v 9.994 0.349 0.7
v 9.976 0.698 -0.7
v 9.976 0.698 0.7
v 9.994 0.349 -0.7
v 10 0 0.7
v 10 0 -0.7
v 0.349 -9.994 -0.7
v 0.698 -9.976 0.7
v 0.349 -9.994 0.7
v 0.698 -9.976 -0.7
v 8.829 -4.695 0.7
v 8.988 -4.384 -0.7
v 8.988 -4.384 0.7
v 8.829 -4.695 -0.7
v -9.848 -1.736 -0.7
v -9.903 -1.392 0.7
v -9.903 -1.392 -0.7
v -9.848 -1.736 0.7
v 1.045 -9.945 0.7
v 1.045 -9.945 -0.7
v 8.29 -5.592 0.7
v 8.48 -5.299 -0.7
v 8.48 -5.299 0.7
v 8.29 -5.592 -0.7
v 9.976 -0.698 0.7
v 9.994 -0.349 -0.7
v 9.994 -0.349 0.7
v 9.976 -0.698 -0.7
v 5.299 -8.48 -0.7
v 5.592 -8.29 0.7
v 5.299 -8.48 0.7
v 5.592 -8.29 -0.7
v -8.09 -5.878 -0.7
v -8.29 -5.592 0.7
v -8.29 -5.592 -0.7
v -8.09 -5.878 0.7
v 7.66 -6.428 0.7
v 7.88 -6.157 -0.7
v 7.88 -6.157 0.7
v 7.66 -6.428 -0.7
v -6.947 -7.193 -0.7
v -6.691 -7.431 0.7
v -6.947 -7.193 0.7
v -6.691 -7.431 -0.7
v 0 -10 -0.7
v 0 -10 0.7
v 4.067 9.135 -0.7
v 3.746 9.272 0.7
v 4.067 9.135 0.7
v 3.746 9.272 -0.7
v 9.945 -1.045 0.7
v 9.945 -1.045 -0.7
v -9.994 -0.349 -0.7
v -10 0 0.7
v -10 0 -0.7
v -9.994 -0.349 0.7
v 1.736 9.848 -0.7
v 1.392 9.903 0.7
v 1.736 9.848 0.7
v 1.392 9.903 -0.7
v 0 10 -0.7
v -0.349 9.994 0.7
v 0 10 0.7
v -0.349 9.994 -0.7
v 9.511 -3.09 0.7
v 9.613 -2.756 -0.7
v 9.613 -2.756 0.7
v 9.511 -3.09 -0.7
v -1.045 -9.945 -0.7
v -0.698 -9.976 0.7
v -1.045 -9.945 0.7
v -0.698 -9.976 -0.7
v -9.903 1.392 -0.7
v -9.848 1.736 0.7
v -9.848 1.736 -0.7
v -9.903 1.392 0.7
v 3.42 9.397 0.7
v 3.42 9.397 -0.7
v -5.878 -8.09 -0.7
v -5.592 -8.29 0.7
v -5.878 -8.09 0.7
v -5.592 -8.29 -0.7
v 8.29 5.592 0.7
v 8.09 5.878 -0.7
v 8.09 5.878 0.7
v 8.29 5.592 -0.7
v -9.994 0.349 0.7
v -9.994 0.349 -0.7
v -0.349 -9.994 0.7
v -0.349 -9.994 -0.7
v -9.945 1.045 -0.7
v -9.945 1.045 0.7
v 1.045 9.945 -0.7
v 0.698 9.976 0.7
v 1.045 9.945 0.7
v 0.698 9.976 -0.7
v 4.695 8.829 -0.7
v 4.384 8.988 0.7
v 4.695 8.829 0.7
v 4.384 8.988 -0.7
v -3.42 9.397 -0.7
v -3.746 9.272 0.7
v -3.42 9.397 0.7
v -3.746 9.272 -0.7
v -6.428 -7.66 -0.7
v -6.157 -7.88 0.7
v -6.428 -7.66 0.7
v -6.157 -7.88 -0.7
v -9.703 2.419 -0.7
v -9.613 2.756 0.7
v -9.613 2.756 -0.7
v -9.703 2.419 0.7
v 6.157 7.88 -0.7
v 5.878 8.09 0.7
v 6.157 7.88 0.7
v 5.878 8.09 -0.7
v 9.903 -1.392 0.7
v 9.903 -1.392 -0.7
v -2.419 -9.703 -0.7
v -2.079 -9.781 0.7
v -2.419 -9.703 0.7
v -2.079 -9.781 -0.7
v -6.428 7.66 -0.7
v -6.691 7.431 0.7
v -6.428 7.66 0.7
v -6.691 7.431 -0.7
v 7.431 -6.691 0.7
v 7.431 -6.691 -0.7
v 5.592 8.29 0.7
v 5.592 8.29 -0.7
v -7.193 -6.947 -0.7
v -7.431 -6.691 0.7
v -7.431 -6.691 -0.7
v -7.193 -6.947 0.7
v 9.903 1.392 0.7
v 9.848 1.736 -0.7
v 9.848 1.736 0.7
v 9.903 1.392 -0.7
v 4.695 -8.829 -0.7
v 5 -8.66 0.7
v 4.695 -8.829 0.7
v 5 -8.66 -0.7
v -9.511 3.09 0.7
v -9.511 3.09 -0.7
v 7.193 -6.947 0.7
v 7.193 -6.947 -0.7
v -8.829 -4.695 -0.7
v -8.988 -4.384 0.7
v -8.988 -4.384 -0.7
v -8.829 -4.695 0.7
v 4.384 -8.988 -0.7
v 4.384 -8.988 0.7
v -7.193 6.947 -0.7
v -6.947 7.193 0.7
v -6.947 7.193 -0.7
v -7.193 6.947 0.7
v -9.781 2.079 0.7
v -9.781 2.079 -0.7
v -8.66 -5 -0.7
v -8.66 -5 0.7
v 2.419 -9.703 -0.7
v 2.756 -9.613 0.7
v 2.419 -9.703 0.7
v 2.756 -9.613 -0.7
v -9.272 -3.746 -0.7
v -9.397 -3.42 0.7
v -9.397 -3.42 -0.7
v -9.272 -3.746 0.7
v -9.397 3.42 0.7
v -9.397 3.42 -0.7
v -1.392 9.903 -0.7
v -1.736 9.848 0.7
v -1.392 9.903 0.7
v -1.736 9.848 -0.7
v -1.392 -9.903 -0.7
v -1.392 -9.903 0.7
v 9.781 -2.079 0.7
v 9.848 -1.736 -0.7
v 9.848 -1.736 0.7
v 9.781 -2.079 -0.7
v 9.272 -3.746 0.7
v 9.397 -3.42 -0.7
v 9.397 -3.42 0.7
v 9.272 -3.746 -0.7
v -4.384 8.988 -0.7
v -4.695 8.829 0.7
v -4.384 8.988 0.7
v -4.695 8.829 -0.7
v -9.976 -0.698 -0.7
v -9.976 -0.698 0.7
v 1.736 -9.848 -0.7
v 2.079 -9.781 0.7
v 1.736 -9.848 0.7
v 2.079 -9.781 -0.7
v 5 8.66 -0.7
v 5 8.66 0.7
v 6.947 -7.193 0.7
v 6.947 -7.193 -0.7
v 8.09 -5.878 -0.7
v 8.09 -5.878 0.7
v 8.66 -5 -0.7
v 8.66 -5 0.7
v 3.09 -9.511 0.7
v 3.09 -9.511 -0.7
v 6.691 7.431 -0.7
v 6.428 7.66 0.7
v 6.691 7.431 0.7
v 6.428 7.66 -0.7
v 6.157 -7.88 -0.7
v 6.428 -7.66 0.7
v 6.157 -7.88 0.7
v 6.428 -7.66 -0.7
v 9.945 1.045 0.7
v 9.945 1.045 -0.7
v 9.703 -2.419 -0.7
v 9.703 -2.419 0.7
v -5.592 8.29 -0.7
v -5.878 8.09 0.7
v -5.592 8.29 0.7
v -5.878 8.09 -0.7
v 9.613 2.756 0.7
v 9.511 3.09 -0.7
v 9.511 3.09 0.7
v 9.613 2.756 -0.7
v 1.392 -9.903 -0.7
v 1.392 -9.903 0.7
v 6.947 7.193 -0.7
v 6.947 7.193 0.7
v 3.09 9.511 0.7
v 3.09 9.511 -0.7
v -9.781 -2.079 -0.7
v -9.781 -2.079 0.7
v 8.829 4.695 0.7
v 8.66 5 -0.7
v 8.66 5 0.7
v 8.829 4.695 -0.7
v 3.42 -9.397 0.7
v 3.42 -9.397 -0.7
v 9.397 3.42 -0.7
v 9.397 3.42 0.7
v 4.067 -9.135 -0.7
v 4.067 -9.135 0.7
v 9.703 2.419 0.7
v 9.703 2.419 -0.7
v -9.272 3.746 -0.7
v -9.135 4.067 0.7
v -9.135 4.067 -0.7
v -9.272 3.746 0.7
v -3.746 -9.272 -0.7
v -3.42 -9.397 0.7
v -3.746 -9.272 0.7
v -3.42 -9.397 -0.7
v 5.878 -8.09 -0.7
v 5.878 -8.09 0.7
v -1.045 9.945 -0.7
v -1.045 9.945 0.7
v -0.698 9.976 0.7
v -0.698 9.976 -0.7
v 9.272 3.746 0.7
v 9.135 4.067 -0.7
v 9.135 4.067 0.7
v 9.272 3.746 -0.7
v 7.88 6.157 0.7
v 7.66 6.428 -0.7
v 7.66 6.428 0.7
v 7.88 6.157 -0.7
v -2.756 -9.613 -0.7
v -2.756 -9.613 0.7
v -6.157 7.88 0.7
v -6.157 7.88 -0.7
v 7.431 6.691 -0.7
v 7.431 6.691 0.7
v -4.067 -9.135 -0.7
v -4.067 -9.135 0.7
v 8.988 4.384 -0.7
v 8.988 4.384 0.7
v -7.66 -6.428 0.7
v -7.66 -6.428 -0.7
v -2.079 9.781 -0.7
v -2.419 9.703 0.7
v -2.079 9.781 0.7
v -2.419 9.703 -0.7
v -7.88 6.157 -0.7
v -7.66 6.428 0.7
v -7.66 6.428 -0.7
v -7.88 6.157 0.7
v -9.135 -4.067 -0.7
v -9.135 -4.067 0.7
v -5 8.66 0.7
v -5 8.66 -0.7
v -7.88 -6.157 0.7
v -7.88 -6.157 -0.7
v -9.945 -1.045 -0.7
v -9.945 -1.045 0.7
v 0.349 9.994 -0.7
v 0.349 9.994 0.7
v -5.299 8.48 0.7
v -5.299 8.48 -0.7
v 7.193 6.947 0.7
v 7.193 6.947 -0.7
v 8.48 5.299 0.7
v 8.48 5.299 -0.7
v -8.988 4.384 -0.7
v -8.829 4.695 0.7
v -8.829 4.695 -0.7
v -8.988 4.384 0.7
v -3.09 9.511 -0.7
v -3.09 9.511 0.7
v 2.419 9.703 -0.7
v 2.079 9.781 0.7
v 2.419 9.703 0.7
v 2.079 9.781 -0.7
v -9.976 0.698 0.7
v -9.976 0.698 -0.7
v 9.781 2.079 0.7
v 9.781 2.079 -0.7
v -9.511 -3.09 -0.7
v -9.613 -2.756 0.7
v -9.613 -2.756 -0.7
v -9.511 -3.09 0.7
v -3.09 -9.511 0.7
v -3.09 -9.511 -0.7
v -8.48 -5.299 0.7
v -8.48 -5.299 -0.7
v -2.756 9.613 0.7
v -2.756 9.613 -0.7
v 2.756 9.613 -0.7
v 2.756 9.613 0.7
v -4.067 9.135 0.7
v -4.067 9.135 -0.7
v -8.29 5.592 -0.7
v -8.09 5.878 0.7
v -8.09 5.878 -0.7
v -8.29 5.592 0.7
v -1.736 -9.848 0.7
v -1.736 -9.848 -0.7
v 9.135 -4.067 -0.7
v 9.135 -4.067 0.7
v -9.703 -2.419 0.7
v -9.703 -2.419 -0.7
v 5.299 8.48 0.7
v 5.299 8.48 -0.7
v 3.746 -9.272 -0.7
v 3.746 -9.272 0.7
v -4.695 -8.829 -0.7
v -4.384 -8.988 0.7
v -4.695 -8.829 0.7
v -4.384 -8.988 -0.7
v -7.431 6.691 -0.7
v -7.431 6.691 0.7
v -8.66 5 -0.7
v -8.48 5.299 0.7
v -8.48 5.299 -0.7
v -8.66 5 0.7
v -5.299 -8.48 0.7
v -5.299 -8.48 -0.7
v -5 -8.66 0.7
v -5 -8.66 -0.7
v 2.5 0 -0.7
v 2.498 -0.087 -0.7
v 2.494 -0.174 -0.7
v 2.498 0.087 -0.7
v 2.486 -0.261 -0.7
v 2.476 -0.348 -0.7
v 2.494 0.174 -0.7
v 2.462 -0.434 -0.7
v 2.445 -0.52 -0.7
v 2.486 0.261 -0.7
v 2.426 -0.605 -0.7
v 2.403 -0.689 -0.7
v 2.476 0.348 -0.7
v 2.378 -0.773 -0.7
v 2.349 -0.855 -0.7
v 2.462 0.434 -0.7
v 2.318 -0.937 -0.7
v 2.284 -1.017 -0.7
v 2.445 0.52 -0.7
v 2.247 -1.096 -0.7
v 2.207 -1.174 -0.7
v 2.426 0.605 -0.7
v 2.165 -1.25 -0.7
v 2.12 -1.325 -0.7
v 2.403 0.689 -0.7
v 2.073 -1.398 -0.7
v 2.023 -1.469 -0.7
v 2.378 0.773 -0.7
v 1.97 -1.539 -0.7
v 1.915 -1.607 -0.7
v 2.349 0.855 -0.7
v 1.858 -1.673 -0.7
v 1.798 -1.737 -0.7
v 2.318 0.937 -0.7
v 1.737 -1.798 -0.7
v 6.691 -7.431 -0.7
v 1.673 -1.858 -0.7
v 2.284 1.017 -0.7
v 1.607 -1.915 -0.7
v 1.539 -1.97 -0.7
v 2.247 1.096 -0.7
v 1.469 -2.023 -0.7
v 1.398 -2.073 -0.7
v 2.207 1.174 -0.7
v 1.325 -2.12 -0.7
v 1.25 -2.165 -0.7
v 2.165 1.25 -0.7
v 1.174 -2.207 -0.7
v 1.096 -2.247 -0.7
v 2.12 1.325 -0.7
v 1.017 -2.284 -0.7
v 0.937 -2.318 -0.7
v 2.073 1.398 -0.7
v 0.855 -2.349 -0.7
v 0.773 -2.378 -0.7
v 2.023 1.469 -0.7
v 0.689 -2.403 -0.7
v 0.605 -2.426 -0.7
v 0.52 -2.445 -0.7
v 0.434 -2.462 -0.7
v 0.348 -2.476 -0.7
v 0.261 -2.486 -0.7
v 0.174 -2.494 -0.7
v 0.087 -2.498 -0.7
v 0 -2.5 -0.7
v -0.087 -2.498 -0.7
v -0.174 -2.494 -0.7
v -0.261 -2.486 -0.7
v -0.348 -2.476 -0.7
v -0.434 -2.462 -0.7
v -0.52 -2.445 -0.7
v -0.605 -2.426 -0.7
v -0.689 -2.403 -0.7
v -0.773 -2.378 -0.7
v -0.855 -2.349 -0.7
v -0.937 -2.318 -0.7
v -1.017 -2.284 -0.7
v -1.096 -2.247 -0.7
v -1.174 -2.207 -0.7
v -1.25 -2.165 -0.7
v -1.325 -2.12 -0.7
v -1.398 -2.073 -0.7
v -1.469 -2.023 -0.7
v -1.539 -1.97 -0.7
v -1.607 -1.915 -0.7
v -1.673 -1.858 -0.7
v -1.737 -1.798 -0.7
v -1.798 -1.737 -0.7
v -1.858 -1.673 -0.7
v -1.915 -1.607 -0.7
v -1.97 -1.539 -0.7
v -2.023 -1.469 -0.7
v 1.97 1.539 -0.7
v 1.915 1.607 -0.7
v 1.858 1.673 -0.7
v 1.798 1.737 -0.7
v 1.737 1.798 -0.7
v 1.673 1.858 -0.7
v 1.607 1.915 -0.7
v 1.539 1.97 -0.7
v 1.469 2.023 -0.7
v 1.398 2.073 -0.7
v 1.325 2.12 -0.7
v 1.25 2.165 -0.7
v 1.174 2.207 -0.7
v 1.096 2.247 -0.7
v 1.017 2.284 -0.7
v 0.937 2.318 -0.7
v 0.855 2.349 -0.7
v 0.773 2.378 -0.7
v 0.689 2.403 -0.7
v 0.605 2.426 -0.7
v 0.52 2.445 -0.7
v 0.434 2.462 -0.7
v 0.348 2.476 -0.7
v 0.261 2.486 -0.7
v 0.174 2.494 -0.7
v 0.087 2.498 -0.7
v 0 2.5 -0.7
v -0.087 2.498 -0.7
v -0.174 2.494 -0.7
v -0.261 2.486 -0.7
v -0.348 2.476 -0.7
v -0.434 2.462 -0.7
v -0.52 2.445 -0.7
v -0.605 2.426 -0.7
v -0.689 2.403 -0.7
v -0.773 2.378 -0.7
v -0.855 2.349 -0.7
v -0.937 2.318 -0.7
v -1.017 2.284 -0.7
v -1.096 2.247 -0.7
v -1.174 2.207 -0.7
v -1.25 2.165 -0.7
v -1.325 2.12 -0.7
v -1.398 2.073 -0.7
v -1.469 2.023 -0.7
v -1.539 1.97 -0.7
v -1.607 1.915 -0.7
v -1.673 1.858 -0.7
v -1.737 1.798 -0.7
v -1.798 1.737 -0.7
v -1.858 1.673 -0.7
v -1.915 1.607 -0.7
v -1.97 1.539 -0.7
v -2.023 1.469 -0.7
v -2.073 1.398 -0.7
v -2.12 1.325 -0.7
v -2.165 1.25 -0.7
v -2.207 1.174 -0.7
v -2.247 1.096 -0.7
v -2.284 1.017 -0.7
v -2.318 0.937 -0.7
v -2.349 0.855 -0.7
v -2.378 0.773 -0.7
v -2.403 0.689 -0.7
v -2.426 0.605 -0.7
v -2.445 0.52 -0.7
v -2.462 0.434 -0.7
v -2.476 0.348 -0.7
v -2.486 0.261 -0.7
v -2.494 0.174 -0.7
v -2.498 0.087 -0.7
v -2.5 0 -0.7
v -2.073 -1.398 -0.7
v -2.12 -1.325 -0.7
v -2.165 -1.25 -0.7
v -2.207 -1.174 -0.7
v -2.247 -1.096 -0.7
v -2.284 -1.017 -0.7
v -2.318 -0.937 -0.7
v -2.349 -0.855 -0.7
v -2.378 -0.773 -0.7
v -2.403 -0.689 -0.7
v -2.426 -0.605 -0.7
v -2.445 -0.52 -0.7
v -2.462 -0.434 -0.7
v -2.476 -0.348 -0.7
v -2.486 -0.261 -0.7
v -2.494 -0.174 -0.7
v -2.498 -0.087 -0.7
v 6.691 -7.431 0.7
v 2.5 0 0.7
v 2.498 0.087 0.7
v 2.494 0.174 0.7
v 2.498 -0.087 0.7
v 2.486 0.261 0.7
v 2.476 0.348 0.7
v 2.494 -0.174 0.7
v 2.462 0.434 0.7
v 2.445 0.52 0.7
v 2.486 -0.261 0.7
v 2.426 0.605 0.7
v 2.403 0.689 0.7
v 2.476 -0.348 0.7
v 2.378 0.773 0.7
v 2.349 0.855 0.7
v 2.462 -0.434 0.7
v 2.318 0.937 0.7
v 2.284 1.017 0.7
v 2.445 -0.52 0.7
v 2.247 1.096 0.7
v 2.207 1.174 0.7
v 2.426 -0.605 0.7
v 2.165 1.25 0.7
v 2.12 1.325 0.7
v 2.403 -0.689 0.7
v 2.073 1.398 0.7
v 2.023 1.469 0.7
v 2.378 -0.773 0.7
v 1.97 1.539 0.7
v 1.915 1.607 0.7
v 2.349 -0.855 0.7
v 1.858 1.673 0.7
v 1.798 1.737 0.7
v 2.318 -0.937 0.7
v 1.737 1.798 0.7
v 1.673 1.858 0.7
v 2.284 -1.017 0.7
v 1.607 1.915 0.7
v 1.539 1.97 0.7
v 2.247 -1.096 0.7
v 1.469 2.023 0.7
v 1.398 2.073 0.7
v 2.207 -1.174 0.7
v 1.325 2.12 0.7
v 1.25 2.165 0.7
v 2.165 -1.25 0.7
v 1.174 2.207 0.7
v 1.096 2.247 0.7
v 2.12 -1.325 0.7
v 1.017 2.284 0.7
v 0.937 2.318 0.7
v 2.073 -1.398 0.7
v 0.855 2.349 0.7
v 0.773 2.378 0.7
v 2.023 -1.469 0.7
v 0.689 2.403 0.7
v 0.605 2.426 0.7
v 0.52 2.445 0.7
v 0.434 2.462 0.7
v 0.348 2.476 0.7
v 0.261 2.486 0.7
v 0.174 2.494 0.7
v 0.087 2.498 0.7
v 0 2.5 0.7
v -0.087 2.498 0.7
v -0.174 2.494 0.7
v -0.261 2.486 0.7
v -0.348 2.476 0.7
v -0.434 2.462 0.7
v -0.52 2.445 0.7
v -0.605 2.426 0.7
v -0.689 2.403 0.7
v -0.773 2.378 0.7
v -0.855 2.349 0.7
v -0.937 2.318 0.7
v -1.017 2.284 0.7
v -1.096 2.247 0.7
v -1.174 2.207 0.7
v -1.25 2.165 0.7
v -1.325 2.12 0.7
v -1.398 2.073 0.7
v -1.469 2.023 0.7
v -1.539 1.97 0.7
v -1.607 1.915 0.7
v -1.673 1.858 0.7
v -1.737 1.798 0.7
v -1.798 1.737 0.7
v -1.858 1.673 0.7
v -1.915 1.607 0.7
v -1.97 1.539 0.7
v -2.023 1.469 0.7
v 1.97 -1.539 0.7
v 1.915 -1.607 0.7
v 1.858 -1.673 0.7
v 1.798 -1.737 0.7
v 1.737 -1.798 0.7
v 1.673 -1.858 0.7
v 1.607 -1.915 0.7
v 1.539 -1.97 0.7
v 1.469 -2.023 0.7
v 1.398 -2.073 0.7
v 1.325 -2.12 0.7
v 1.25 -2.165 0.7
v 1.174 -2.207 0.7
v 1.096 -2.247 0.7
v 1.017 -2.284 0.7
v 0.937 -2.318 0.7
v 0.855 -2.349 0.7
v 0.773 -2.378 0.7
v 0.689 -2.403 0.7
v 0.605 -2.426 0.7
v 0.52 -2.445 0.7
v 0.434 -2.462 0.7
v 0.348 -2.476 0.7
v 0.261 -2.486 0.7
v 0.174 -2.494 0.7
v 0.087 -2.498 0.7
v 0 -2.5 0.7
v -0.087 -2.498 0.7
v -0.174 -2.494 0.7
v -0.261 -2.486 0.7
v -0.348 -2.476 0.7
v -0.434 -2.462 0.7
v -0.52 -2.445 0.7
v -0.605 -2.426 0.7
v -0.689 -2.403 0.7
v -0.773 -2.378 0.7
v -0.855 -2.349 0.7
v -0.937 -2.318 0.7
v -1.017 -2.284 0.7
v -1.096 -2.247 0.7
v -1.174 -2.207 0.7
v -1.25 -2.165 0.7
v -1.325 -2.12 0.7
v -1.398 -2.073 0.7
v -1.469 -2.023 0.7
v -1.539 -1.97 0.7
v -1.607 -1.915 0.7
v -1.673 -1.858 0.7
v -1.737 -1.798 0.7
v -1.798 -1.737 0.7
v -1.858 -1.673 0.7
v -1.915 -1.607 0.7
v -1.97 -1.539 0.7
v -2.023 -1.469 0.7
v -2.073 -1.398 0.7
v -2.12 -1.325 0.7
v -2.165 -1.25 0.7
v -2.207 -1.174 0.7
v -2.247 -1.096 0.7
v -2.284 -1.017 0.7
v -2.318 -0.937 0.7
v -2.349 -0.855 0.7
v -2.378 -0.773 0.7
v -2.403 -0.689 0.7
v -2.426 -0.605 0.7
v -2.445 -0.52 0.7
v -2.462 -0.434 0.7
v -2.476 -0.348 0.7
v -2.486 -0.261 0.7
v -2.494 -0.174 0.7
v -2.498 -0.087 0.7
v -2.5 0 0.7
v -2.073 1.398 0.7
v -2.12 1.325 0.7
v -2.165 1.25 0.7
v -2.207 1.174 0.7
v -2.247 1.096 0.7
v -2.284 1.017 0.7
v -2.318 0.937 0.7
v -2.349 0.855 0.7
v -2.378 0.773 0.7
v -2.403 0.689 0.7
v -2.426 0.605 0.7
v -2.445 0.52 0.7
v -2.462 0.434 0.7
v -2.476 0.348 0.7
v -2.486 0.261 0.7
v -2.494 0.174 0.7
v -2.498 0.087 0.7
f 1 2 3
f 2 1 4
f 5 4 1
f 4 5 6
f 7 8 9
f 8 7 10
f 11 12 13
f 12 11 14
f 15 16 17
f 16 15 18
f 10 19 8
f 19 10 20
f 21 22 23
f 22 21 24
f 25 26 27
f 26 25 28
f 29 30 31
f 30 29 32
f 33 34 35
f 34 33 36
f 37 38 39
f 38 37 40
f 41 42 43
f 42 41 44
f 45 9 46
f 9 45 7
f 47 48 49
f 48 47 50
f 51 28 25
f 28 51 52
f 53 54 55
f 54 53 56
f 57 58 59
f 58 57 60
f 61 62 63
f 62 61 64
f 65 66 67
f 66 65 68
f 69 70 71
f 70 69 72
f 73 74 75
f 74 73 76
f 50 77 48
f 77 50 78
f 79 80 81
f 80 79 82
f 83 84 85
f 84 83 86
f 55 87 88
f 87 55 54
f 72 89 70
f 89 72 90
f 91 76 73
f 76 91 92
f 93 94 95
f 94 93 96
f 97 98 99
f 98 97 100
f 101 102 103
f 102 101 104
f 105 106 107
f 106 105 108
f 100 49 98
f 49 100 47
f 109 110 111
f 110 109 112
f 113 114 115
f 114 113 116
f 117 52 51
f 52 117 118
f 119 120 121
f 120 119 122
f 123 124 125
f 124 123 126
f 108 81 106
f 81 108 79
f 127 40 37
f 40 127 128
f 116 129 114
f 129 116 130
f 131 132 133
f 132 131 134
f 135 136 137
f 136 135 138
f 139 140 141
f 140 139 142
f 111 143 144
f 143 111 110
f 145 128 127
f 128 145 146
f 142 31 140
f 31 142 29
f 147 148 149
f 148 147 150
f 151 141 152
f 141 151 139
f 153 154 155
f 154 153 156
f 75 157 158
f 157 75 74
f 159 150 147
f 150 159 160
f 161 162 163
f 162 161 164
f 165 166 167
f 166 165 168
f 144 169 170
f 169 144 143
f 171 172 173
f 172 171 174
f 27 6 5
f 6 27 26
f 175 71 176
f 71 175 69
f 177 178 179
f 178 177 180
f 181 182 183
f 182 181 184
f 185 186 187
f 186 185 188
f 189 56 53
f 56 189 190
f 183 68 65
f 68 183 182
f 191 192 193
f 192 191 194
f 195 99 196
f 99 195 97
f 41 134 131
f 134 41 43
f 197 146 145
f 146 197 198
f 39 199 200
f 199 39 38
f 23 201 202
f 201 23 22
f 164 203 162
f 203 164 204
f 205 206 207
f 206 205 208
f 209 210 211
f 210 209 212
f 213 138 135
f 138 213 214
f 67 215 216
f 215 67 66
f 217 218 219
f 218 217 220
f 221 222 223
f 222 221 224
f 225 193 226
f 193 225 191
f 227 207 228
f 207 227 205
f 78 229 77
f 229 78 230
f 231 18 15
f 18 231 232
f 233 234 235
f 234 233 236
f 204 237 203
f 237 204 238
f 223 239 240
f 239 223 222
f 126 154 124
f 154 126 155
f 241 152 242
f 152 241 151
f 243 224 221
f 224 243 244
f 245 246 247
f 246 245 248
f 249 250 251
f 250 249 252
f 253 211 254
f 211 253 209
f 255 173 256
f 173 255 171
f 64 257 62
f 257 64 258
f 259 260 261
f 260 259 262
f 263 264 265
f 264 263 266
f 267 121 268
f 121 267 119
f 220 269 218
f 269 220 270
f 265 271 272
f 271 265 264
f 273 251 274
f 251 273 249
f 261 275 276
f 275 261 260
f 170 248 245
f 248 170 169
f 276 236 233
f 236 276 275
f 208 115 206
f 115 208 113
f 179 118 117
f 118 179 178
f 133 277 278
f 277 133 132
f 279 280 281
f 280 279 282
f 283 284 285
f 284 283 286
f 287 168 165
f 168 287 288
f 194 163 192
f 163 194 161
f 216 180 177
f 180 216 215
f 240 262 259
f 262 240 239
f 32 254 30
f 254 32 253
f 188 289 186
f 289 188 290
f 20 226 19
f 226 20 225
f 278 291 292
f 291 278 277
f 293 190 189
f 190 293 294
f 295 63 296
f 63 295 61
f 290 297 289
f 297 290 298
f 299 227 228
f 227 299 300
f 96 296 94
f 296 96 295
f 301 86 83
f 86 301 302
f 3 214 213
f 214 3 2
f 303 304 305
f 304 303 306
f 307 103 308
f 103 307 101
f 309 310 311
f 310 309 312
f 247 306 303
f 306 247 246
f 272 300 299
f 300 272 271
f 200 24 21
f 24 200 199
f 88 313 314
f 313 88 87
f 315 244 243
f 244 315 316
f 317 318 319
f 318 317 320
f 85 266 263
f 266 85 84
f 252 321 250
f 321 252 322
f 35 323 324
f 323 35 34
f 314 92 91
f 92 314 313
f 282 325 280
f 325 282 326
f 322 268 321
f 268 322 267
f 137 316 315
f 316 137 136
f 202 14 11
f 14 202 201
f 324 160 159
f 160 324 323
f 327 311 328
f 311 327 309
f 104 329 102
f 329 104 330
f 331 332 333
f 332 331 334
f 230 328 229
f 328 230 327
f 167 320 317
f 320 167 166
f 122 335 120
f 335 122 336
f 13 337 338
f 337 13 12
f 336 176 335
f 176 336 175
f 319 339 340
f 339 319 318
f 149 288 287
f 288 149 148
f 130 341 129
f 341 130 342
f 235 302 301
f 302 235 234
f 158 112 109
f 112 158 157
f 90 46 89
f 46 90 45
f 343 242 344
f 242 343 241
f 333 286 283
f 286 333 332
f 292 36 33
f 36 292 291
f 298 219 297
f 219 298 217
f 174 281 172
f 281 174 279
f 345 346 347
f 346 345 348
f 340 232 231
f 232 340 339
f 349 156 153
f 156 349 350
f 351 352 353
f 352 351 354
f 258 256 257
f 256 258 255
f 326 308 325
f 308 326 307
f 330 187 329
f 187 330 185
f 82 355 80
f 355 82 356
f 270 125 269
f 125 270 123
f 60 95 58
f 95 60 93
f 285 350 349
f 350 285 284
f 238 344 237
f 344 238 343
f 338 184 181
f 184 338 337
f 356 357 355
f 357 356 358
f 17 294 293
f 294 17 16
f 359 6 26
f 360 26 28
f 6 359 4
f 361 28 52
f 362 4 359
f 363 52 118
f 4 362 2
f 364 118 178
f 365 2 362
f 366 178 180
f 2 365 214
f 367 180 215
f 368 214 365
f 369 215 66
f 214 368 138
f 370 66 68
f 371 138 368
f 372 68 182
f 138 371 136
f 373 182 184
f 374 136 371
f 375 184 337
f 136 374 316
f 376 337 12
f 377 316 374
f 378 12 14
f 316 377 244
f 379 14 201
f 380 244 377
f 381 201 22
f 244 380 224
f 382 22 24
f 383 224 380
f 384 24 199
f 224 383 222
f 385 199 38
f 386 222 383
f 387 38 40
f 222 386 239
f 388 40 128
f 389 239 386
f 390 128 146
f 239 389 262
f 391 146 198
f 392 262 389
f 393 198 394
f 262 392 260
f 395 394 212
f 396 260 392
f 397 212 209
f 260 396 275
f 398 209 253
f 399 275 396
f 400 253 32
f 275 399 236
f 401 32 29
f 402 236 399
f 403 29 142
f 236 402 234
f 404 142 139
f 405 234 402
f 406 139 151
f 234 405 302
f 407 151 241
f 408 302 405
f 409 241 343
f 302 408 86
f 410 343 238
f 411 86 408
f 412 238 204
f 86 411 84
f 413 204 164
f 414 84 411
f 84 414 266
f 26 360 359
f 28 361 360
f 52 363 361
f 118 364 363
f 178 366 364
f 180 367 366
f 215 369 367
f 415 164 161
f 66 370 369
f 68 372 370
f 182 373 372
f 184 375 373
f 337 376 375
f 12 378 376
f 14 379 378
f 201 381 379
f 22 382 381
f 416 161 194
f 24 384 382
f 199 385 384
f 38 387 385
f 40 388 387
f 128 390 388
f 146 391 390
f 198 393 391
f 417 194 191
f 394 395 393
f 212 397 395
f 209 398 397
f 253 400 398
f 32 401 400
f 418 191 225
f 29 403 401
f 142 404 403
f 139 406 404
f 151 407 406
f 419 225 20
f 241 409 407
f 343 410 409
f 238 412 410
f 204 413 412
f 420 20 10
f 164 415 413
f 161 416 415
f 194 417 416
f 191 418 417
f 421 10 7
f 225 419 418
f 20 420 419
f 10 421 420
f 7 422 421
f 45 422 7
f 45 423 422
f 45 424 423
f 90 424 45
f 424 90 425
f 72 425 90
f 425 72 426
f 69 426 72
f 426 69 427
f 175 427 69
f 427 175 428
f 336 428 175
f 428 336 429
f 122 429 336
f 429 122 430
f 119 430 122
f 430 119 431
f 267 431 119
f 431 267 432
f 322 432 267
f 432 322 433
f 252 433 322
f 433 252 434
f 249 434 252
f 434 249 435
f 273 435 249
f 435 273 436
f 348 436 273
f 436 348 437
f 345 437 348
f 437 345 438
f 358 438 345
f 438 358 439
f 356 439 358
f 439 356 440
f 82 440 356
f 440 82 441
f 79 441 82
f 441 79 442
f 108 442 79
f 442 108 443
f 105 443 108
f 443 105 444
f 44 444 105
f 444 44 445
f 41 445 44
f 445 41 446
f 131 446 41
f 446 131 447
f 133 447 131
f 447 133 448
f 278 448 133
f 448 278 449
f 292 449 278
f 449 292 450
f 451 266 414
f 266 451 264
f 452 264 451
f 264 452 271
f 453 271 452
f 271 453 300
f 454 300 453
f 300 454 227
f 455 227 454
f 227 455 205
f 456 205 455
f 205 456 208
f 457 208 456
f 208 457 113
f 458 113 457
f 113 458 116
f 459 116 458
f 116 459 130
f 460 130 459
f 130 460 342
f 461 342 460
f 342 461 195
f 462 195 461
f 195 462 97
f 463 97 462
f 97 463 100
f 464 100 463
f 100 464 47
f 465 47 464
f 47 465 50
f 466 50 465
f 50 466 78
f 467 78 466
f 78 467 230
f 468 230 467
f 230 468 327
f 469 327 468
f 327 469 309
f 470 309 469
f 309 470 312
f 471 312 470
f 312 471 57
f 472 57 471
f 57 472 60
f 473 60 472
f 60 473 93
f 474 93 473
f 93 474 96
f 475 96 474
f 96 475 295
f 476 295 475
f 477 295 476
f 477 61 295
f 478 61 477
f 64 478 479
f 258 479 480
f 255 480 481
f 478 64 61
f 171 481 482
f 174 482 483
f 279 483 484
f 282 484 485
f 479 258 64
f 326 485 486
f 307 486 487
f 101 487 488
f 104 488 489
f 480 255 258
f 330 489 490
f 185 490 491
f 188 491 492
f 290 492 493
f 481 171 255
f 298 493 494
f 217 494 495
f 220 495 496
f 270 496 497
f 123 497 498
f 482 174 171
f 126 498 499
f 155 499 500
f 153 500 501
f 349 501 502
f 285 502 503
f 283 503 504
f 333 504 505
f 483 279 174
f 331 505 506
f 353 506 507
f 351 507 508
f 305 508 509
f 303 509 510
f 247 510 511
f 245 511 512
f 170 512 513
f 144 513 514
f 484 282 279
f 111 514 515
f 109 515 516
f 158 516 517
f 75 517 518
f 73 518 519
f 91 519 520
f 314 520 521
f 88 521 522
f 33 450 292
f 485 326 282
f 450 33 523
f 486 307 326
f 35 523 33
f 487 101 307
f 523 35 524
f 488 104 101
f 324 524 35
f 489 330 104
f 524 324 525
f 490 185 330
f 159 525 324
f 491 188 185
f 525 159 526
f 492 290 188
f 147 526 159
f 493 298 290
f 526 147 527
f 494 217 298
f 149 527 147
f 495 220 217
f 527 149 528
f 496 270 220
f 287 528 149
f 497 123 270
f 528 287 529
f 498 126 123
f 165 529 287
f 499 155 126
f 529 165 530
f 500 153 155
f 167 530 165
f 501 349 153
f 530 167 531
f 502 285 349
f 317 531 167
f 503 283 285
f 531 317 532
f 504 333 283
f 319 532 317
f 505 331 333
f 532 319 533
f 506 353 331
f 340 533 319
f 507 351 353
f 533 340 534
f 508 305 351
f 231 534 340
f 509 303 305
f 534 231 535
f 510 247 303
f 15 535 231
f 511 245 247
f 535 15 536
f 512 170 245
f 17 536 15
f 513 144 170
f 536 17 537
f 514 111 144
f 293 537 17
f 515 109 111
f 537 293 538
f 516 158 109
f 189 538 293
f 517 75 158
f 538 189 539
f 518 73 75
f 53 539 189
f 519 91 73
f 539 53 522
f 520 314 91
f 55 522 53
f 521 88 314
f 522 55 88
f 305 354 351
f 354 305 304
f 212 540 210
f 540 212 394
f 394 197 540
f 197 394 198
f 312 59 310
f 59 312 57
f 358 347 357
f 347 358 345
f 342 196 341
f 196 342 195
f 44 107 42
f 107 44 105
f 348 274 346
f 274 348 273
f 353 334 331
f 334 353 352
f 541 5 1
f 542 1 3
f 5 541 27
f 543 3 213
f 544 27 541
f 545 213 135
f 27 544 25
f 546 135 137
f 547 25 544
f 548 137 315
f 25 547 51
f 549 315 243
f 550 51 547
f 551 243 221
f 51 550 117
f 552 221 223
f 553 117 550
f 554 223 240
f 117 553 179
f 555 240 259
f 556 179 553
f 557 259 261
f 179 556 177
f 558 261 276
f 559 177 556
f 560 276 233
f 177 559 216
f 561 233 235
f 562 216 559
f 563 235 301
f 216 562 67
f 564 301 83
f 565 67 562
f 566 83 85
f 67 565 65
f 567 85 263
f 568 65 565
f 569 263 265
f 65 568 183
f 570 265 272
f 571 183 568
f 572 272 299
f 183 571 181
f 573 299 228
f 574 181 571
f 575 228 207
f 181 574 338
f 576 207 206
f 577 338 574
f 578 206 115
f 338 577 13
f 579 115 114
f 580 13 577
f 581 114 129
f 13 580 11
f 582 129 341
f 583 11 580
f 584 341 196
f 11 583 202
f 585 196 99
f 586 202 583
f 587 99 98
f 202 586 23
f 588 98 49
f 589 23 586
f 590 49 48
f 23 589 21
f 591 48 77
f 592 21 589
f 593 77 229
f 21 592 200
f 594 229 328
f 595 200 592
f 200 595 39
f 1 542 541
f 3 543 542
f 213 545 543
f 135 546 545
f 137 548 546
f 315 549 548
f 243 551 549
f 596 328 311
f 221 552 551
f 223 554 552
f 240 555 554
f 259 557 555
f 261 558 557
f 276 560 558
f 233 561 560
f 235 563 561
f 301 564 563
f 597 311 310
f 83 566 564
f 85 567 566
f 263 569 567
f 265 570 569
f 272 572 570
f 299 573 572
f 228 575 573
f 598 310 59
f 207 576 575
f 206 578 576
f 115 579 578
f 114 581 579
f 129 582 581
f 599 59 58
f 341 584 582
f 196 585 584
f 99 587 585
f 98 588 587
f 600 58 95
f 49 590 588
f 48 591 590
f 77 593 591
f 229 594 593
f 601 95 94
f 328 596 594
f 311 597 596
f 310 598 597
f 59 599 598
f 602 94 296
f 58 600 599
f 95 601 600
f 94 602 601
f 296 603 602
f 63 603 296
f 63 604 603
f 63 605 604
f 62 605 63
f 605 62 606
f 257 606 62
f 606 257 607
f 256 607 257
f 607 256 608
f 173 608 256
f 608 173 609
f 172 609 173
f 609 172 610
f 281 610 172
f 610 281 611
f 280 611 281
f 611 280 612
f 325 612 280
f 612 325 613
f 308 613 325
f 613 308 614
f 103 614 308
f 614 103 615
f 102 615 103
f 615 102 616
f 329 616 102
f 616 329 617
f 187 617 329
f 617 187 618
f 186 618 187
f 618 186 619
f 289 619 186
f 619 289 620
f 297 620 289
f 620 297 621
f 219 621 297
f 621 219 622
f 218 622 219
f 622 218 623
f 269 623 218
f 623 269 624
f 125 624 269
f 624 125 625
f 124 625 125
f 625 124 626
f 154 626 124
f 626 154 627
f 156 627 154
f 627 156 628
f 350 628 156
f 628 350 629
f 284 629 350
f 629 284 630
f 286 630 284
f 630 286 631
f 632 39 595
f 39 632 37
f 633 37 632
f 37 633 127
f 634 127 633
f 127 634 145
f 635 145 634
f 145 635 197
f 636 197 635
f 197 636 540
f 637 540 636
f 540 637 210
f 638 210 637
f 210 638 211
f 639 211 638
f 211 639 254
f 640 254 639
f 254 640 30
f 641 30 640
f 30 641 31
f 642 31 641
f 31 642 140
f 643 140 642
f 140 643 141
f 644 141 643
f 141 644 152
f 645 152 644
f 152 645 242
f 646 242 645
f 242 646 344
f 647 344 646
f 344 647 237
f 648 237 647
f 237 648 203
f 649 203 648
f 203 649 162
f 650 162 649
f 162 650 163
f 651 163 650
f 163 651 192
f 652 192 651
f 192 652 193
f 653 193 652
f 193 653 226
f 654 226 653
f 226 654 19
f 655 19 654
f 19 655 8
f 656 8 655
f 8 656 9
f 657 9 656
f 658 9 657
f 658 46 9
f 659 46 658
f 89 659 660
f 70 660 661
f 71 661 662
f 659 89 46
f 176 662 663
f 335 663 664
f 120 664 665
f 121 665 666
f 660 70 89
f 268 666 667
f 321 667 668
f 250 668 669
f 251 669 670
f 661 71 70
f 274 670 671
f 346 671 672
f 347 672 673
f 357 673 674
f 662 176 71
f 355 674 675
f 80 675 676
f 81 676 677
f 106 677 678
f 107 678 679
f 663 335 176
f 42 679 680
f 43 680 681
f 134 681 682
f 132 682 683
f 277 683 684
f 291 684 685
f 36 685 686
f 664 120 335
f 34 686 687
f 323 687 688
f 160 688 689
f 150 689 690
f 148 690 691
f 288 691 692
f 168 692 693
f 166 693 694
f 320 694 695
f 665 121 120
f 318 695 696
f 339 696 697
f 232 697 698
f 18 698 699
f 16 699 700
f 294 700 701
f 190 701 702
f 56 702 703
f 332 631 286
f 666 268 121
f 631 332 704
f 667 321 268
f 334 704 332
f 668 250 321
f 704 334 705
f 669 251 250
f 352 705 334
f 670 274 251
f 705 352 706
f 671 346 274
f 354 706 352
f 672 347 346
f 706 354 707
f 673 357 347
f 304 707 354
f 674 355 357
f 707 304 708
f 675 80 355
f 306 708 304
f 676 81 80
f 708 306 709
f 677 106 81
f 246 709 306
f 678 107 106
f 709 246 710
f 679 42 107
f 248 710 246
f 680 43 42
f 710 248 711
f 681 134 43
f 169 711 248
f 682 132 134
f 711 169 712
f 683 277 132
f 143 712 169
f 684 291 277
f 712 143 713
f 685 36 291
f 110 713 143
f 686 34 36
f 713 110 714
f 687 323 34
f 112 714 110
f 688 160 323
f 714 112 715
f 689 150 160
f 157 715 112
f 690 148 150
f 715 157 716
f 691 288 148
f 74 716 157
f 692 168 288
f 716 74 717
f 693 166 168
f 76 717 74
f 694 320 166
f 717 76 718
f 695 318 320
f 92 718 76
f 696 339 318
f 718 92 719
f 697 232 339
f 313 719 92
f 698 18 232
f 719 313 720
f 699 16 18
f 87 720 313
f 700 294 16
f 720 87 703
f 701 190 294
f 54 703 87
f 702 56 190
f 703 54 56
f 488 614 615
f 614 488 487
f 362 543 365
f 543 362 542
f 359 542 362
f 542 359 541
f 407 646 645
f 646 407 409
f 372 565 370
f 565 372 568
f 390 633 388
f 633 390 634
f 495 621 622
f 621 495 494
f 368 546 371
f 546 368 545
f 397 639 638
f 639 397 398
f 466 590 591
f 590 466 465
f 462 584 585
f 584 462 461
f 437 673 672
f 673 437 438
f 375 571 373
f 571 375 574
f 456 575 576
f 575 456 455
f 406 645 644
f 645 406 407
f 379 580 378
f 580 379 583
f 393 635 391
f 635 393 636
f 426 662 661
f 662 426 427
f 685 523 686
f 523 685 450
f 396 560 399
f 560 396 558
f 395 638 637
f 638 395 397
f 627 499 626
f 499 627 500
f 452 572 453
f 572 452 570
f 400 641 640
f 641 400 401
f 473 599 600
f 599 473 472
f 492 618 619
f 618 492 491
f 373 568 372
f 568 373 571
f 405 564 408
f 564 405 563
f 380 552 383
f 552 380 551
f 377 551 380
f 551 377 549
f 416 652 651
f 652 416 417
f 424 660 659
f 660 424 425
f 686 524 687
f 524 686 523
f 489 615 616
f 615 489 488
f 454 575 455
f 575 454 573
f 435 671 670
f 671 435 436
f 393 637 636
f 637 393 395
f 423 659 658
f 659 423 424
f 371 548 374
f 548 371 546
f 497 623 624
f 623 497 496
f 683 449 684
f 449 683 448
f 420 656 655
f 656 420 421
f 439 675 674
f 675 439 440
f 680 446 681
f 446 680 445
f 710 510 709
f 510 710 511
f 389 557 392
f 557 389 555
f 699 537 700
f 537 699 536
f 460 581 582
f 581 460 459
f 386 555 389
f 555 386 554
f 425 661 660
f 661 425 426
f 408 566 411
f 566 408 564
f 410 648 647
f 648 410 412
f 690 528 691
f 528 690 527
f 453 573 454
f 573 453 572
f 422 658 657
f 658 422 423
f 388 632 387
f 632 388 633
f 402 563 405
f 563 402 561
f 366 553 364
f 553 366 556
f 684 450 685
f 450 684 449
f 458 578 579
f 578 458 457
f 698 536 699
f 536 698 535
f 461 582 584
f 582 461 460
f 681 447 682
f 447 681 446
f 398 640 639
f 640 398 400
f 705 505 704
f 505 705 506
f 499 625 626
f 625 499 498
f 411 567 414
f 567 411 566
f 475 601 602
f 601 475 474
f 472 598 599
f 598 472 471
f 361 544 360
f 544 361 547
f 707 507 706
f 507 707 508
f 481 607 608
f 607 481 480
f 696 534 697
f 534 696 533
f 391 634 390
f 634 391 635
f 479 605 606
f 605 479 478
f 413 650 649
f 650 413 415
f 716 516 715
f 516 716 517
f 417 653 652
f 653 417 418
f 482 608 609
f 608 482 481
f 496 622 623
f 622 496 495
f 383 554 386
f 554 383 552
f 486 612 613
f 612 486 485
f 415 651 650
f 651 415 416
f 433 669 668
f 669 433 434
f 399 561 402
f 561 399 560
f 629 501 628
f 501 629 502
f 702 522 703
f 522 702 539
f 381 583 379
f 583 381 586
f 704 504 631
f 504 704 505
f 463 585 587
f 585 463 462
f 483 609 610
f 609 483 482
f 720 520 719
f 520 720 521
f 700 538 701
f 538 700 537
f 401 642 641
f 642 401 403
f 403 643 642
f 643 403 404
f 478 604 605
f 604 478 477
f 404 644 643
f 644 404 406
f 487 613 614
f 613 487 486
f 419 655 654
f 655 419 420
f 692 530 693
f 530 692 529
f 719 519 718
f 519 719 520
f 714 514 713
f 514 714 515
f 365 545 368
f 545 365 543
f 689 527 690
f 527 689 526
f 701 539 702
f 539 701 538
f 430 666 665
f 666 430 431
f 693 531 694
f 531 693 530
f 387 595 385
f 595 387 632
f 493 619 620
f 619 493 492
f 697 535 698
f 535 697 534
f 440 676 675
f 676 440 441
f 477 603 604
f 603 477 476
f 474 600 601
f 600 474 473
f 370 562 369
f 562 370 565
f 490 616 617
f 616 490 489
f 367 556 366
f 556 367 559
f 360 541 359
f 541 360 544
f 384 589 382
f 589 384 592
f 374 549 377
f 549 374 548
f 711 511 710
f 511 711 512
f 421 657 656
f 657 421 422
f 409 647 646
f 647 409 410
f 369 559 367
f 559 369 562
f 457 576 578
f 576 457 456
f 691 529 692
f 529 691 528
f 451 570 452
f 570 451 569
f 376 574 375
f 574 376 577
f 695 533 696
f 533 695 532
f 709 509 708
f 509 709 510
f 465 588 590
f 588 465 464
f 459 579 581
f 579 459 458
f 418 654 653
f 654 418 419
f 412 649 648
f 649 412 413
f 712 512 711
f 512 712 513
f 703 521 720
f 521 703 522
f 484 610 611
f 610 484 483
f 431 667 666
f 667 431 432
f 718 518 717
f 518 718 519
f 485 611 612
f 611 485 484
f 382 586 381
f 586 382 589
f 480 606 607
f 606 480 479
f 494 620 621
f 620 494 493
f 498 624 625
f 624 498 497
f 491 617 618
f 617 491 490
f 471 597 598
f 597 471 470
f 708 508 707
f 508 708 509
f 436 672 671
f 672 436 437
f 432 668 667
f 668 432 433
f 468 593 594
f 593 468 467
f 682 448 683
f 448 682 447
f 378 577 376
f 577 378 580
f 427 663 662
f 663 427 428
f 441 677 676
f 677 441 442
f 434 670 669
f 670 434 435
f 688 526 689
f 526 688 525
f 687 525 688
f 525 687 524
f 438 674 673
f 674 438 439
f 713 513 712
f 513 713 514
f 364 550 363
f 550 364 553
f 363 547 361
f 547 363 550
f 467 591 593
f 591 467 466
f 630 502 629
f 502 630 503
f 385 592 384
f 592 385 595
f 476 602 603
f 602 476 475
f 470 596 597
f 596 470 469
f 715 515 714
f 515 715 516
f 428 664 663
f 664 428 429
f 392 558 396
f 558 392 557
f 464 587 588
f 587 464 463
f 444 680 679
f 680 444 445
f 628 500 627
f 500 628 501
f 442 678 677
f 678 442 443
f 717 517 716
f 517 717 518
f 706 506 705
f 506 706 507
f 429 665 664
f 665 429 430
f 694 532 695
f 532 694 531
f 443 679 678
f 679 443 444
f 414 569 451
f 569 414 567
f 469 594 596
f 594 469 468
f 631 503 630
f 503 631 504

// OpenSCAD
// Penny washer: 5.0mm inner hole, 20.0mm outer diameter, 1.4mm thickness

outer_diameter = 20.0;
inner_diameter = 5.0;
thickness      = 1.4;

overcut = 0.2; // small extra for clean boolean cut

$fn = 180; // high resolution so the hole is truly circular

module washer(od, id, h) {
    difference() {
        cylinder(d=od, h=h, center=true);
        cylinder(d=id, h=h + 2*overcut, center=true);
    }
}

washer(outer_diameter, inner_diameter, thickness);
